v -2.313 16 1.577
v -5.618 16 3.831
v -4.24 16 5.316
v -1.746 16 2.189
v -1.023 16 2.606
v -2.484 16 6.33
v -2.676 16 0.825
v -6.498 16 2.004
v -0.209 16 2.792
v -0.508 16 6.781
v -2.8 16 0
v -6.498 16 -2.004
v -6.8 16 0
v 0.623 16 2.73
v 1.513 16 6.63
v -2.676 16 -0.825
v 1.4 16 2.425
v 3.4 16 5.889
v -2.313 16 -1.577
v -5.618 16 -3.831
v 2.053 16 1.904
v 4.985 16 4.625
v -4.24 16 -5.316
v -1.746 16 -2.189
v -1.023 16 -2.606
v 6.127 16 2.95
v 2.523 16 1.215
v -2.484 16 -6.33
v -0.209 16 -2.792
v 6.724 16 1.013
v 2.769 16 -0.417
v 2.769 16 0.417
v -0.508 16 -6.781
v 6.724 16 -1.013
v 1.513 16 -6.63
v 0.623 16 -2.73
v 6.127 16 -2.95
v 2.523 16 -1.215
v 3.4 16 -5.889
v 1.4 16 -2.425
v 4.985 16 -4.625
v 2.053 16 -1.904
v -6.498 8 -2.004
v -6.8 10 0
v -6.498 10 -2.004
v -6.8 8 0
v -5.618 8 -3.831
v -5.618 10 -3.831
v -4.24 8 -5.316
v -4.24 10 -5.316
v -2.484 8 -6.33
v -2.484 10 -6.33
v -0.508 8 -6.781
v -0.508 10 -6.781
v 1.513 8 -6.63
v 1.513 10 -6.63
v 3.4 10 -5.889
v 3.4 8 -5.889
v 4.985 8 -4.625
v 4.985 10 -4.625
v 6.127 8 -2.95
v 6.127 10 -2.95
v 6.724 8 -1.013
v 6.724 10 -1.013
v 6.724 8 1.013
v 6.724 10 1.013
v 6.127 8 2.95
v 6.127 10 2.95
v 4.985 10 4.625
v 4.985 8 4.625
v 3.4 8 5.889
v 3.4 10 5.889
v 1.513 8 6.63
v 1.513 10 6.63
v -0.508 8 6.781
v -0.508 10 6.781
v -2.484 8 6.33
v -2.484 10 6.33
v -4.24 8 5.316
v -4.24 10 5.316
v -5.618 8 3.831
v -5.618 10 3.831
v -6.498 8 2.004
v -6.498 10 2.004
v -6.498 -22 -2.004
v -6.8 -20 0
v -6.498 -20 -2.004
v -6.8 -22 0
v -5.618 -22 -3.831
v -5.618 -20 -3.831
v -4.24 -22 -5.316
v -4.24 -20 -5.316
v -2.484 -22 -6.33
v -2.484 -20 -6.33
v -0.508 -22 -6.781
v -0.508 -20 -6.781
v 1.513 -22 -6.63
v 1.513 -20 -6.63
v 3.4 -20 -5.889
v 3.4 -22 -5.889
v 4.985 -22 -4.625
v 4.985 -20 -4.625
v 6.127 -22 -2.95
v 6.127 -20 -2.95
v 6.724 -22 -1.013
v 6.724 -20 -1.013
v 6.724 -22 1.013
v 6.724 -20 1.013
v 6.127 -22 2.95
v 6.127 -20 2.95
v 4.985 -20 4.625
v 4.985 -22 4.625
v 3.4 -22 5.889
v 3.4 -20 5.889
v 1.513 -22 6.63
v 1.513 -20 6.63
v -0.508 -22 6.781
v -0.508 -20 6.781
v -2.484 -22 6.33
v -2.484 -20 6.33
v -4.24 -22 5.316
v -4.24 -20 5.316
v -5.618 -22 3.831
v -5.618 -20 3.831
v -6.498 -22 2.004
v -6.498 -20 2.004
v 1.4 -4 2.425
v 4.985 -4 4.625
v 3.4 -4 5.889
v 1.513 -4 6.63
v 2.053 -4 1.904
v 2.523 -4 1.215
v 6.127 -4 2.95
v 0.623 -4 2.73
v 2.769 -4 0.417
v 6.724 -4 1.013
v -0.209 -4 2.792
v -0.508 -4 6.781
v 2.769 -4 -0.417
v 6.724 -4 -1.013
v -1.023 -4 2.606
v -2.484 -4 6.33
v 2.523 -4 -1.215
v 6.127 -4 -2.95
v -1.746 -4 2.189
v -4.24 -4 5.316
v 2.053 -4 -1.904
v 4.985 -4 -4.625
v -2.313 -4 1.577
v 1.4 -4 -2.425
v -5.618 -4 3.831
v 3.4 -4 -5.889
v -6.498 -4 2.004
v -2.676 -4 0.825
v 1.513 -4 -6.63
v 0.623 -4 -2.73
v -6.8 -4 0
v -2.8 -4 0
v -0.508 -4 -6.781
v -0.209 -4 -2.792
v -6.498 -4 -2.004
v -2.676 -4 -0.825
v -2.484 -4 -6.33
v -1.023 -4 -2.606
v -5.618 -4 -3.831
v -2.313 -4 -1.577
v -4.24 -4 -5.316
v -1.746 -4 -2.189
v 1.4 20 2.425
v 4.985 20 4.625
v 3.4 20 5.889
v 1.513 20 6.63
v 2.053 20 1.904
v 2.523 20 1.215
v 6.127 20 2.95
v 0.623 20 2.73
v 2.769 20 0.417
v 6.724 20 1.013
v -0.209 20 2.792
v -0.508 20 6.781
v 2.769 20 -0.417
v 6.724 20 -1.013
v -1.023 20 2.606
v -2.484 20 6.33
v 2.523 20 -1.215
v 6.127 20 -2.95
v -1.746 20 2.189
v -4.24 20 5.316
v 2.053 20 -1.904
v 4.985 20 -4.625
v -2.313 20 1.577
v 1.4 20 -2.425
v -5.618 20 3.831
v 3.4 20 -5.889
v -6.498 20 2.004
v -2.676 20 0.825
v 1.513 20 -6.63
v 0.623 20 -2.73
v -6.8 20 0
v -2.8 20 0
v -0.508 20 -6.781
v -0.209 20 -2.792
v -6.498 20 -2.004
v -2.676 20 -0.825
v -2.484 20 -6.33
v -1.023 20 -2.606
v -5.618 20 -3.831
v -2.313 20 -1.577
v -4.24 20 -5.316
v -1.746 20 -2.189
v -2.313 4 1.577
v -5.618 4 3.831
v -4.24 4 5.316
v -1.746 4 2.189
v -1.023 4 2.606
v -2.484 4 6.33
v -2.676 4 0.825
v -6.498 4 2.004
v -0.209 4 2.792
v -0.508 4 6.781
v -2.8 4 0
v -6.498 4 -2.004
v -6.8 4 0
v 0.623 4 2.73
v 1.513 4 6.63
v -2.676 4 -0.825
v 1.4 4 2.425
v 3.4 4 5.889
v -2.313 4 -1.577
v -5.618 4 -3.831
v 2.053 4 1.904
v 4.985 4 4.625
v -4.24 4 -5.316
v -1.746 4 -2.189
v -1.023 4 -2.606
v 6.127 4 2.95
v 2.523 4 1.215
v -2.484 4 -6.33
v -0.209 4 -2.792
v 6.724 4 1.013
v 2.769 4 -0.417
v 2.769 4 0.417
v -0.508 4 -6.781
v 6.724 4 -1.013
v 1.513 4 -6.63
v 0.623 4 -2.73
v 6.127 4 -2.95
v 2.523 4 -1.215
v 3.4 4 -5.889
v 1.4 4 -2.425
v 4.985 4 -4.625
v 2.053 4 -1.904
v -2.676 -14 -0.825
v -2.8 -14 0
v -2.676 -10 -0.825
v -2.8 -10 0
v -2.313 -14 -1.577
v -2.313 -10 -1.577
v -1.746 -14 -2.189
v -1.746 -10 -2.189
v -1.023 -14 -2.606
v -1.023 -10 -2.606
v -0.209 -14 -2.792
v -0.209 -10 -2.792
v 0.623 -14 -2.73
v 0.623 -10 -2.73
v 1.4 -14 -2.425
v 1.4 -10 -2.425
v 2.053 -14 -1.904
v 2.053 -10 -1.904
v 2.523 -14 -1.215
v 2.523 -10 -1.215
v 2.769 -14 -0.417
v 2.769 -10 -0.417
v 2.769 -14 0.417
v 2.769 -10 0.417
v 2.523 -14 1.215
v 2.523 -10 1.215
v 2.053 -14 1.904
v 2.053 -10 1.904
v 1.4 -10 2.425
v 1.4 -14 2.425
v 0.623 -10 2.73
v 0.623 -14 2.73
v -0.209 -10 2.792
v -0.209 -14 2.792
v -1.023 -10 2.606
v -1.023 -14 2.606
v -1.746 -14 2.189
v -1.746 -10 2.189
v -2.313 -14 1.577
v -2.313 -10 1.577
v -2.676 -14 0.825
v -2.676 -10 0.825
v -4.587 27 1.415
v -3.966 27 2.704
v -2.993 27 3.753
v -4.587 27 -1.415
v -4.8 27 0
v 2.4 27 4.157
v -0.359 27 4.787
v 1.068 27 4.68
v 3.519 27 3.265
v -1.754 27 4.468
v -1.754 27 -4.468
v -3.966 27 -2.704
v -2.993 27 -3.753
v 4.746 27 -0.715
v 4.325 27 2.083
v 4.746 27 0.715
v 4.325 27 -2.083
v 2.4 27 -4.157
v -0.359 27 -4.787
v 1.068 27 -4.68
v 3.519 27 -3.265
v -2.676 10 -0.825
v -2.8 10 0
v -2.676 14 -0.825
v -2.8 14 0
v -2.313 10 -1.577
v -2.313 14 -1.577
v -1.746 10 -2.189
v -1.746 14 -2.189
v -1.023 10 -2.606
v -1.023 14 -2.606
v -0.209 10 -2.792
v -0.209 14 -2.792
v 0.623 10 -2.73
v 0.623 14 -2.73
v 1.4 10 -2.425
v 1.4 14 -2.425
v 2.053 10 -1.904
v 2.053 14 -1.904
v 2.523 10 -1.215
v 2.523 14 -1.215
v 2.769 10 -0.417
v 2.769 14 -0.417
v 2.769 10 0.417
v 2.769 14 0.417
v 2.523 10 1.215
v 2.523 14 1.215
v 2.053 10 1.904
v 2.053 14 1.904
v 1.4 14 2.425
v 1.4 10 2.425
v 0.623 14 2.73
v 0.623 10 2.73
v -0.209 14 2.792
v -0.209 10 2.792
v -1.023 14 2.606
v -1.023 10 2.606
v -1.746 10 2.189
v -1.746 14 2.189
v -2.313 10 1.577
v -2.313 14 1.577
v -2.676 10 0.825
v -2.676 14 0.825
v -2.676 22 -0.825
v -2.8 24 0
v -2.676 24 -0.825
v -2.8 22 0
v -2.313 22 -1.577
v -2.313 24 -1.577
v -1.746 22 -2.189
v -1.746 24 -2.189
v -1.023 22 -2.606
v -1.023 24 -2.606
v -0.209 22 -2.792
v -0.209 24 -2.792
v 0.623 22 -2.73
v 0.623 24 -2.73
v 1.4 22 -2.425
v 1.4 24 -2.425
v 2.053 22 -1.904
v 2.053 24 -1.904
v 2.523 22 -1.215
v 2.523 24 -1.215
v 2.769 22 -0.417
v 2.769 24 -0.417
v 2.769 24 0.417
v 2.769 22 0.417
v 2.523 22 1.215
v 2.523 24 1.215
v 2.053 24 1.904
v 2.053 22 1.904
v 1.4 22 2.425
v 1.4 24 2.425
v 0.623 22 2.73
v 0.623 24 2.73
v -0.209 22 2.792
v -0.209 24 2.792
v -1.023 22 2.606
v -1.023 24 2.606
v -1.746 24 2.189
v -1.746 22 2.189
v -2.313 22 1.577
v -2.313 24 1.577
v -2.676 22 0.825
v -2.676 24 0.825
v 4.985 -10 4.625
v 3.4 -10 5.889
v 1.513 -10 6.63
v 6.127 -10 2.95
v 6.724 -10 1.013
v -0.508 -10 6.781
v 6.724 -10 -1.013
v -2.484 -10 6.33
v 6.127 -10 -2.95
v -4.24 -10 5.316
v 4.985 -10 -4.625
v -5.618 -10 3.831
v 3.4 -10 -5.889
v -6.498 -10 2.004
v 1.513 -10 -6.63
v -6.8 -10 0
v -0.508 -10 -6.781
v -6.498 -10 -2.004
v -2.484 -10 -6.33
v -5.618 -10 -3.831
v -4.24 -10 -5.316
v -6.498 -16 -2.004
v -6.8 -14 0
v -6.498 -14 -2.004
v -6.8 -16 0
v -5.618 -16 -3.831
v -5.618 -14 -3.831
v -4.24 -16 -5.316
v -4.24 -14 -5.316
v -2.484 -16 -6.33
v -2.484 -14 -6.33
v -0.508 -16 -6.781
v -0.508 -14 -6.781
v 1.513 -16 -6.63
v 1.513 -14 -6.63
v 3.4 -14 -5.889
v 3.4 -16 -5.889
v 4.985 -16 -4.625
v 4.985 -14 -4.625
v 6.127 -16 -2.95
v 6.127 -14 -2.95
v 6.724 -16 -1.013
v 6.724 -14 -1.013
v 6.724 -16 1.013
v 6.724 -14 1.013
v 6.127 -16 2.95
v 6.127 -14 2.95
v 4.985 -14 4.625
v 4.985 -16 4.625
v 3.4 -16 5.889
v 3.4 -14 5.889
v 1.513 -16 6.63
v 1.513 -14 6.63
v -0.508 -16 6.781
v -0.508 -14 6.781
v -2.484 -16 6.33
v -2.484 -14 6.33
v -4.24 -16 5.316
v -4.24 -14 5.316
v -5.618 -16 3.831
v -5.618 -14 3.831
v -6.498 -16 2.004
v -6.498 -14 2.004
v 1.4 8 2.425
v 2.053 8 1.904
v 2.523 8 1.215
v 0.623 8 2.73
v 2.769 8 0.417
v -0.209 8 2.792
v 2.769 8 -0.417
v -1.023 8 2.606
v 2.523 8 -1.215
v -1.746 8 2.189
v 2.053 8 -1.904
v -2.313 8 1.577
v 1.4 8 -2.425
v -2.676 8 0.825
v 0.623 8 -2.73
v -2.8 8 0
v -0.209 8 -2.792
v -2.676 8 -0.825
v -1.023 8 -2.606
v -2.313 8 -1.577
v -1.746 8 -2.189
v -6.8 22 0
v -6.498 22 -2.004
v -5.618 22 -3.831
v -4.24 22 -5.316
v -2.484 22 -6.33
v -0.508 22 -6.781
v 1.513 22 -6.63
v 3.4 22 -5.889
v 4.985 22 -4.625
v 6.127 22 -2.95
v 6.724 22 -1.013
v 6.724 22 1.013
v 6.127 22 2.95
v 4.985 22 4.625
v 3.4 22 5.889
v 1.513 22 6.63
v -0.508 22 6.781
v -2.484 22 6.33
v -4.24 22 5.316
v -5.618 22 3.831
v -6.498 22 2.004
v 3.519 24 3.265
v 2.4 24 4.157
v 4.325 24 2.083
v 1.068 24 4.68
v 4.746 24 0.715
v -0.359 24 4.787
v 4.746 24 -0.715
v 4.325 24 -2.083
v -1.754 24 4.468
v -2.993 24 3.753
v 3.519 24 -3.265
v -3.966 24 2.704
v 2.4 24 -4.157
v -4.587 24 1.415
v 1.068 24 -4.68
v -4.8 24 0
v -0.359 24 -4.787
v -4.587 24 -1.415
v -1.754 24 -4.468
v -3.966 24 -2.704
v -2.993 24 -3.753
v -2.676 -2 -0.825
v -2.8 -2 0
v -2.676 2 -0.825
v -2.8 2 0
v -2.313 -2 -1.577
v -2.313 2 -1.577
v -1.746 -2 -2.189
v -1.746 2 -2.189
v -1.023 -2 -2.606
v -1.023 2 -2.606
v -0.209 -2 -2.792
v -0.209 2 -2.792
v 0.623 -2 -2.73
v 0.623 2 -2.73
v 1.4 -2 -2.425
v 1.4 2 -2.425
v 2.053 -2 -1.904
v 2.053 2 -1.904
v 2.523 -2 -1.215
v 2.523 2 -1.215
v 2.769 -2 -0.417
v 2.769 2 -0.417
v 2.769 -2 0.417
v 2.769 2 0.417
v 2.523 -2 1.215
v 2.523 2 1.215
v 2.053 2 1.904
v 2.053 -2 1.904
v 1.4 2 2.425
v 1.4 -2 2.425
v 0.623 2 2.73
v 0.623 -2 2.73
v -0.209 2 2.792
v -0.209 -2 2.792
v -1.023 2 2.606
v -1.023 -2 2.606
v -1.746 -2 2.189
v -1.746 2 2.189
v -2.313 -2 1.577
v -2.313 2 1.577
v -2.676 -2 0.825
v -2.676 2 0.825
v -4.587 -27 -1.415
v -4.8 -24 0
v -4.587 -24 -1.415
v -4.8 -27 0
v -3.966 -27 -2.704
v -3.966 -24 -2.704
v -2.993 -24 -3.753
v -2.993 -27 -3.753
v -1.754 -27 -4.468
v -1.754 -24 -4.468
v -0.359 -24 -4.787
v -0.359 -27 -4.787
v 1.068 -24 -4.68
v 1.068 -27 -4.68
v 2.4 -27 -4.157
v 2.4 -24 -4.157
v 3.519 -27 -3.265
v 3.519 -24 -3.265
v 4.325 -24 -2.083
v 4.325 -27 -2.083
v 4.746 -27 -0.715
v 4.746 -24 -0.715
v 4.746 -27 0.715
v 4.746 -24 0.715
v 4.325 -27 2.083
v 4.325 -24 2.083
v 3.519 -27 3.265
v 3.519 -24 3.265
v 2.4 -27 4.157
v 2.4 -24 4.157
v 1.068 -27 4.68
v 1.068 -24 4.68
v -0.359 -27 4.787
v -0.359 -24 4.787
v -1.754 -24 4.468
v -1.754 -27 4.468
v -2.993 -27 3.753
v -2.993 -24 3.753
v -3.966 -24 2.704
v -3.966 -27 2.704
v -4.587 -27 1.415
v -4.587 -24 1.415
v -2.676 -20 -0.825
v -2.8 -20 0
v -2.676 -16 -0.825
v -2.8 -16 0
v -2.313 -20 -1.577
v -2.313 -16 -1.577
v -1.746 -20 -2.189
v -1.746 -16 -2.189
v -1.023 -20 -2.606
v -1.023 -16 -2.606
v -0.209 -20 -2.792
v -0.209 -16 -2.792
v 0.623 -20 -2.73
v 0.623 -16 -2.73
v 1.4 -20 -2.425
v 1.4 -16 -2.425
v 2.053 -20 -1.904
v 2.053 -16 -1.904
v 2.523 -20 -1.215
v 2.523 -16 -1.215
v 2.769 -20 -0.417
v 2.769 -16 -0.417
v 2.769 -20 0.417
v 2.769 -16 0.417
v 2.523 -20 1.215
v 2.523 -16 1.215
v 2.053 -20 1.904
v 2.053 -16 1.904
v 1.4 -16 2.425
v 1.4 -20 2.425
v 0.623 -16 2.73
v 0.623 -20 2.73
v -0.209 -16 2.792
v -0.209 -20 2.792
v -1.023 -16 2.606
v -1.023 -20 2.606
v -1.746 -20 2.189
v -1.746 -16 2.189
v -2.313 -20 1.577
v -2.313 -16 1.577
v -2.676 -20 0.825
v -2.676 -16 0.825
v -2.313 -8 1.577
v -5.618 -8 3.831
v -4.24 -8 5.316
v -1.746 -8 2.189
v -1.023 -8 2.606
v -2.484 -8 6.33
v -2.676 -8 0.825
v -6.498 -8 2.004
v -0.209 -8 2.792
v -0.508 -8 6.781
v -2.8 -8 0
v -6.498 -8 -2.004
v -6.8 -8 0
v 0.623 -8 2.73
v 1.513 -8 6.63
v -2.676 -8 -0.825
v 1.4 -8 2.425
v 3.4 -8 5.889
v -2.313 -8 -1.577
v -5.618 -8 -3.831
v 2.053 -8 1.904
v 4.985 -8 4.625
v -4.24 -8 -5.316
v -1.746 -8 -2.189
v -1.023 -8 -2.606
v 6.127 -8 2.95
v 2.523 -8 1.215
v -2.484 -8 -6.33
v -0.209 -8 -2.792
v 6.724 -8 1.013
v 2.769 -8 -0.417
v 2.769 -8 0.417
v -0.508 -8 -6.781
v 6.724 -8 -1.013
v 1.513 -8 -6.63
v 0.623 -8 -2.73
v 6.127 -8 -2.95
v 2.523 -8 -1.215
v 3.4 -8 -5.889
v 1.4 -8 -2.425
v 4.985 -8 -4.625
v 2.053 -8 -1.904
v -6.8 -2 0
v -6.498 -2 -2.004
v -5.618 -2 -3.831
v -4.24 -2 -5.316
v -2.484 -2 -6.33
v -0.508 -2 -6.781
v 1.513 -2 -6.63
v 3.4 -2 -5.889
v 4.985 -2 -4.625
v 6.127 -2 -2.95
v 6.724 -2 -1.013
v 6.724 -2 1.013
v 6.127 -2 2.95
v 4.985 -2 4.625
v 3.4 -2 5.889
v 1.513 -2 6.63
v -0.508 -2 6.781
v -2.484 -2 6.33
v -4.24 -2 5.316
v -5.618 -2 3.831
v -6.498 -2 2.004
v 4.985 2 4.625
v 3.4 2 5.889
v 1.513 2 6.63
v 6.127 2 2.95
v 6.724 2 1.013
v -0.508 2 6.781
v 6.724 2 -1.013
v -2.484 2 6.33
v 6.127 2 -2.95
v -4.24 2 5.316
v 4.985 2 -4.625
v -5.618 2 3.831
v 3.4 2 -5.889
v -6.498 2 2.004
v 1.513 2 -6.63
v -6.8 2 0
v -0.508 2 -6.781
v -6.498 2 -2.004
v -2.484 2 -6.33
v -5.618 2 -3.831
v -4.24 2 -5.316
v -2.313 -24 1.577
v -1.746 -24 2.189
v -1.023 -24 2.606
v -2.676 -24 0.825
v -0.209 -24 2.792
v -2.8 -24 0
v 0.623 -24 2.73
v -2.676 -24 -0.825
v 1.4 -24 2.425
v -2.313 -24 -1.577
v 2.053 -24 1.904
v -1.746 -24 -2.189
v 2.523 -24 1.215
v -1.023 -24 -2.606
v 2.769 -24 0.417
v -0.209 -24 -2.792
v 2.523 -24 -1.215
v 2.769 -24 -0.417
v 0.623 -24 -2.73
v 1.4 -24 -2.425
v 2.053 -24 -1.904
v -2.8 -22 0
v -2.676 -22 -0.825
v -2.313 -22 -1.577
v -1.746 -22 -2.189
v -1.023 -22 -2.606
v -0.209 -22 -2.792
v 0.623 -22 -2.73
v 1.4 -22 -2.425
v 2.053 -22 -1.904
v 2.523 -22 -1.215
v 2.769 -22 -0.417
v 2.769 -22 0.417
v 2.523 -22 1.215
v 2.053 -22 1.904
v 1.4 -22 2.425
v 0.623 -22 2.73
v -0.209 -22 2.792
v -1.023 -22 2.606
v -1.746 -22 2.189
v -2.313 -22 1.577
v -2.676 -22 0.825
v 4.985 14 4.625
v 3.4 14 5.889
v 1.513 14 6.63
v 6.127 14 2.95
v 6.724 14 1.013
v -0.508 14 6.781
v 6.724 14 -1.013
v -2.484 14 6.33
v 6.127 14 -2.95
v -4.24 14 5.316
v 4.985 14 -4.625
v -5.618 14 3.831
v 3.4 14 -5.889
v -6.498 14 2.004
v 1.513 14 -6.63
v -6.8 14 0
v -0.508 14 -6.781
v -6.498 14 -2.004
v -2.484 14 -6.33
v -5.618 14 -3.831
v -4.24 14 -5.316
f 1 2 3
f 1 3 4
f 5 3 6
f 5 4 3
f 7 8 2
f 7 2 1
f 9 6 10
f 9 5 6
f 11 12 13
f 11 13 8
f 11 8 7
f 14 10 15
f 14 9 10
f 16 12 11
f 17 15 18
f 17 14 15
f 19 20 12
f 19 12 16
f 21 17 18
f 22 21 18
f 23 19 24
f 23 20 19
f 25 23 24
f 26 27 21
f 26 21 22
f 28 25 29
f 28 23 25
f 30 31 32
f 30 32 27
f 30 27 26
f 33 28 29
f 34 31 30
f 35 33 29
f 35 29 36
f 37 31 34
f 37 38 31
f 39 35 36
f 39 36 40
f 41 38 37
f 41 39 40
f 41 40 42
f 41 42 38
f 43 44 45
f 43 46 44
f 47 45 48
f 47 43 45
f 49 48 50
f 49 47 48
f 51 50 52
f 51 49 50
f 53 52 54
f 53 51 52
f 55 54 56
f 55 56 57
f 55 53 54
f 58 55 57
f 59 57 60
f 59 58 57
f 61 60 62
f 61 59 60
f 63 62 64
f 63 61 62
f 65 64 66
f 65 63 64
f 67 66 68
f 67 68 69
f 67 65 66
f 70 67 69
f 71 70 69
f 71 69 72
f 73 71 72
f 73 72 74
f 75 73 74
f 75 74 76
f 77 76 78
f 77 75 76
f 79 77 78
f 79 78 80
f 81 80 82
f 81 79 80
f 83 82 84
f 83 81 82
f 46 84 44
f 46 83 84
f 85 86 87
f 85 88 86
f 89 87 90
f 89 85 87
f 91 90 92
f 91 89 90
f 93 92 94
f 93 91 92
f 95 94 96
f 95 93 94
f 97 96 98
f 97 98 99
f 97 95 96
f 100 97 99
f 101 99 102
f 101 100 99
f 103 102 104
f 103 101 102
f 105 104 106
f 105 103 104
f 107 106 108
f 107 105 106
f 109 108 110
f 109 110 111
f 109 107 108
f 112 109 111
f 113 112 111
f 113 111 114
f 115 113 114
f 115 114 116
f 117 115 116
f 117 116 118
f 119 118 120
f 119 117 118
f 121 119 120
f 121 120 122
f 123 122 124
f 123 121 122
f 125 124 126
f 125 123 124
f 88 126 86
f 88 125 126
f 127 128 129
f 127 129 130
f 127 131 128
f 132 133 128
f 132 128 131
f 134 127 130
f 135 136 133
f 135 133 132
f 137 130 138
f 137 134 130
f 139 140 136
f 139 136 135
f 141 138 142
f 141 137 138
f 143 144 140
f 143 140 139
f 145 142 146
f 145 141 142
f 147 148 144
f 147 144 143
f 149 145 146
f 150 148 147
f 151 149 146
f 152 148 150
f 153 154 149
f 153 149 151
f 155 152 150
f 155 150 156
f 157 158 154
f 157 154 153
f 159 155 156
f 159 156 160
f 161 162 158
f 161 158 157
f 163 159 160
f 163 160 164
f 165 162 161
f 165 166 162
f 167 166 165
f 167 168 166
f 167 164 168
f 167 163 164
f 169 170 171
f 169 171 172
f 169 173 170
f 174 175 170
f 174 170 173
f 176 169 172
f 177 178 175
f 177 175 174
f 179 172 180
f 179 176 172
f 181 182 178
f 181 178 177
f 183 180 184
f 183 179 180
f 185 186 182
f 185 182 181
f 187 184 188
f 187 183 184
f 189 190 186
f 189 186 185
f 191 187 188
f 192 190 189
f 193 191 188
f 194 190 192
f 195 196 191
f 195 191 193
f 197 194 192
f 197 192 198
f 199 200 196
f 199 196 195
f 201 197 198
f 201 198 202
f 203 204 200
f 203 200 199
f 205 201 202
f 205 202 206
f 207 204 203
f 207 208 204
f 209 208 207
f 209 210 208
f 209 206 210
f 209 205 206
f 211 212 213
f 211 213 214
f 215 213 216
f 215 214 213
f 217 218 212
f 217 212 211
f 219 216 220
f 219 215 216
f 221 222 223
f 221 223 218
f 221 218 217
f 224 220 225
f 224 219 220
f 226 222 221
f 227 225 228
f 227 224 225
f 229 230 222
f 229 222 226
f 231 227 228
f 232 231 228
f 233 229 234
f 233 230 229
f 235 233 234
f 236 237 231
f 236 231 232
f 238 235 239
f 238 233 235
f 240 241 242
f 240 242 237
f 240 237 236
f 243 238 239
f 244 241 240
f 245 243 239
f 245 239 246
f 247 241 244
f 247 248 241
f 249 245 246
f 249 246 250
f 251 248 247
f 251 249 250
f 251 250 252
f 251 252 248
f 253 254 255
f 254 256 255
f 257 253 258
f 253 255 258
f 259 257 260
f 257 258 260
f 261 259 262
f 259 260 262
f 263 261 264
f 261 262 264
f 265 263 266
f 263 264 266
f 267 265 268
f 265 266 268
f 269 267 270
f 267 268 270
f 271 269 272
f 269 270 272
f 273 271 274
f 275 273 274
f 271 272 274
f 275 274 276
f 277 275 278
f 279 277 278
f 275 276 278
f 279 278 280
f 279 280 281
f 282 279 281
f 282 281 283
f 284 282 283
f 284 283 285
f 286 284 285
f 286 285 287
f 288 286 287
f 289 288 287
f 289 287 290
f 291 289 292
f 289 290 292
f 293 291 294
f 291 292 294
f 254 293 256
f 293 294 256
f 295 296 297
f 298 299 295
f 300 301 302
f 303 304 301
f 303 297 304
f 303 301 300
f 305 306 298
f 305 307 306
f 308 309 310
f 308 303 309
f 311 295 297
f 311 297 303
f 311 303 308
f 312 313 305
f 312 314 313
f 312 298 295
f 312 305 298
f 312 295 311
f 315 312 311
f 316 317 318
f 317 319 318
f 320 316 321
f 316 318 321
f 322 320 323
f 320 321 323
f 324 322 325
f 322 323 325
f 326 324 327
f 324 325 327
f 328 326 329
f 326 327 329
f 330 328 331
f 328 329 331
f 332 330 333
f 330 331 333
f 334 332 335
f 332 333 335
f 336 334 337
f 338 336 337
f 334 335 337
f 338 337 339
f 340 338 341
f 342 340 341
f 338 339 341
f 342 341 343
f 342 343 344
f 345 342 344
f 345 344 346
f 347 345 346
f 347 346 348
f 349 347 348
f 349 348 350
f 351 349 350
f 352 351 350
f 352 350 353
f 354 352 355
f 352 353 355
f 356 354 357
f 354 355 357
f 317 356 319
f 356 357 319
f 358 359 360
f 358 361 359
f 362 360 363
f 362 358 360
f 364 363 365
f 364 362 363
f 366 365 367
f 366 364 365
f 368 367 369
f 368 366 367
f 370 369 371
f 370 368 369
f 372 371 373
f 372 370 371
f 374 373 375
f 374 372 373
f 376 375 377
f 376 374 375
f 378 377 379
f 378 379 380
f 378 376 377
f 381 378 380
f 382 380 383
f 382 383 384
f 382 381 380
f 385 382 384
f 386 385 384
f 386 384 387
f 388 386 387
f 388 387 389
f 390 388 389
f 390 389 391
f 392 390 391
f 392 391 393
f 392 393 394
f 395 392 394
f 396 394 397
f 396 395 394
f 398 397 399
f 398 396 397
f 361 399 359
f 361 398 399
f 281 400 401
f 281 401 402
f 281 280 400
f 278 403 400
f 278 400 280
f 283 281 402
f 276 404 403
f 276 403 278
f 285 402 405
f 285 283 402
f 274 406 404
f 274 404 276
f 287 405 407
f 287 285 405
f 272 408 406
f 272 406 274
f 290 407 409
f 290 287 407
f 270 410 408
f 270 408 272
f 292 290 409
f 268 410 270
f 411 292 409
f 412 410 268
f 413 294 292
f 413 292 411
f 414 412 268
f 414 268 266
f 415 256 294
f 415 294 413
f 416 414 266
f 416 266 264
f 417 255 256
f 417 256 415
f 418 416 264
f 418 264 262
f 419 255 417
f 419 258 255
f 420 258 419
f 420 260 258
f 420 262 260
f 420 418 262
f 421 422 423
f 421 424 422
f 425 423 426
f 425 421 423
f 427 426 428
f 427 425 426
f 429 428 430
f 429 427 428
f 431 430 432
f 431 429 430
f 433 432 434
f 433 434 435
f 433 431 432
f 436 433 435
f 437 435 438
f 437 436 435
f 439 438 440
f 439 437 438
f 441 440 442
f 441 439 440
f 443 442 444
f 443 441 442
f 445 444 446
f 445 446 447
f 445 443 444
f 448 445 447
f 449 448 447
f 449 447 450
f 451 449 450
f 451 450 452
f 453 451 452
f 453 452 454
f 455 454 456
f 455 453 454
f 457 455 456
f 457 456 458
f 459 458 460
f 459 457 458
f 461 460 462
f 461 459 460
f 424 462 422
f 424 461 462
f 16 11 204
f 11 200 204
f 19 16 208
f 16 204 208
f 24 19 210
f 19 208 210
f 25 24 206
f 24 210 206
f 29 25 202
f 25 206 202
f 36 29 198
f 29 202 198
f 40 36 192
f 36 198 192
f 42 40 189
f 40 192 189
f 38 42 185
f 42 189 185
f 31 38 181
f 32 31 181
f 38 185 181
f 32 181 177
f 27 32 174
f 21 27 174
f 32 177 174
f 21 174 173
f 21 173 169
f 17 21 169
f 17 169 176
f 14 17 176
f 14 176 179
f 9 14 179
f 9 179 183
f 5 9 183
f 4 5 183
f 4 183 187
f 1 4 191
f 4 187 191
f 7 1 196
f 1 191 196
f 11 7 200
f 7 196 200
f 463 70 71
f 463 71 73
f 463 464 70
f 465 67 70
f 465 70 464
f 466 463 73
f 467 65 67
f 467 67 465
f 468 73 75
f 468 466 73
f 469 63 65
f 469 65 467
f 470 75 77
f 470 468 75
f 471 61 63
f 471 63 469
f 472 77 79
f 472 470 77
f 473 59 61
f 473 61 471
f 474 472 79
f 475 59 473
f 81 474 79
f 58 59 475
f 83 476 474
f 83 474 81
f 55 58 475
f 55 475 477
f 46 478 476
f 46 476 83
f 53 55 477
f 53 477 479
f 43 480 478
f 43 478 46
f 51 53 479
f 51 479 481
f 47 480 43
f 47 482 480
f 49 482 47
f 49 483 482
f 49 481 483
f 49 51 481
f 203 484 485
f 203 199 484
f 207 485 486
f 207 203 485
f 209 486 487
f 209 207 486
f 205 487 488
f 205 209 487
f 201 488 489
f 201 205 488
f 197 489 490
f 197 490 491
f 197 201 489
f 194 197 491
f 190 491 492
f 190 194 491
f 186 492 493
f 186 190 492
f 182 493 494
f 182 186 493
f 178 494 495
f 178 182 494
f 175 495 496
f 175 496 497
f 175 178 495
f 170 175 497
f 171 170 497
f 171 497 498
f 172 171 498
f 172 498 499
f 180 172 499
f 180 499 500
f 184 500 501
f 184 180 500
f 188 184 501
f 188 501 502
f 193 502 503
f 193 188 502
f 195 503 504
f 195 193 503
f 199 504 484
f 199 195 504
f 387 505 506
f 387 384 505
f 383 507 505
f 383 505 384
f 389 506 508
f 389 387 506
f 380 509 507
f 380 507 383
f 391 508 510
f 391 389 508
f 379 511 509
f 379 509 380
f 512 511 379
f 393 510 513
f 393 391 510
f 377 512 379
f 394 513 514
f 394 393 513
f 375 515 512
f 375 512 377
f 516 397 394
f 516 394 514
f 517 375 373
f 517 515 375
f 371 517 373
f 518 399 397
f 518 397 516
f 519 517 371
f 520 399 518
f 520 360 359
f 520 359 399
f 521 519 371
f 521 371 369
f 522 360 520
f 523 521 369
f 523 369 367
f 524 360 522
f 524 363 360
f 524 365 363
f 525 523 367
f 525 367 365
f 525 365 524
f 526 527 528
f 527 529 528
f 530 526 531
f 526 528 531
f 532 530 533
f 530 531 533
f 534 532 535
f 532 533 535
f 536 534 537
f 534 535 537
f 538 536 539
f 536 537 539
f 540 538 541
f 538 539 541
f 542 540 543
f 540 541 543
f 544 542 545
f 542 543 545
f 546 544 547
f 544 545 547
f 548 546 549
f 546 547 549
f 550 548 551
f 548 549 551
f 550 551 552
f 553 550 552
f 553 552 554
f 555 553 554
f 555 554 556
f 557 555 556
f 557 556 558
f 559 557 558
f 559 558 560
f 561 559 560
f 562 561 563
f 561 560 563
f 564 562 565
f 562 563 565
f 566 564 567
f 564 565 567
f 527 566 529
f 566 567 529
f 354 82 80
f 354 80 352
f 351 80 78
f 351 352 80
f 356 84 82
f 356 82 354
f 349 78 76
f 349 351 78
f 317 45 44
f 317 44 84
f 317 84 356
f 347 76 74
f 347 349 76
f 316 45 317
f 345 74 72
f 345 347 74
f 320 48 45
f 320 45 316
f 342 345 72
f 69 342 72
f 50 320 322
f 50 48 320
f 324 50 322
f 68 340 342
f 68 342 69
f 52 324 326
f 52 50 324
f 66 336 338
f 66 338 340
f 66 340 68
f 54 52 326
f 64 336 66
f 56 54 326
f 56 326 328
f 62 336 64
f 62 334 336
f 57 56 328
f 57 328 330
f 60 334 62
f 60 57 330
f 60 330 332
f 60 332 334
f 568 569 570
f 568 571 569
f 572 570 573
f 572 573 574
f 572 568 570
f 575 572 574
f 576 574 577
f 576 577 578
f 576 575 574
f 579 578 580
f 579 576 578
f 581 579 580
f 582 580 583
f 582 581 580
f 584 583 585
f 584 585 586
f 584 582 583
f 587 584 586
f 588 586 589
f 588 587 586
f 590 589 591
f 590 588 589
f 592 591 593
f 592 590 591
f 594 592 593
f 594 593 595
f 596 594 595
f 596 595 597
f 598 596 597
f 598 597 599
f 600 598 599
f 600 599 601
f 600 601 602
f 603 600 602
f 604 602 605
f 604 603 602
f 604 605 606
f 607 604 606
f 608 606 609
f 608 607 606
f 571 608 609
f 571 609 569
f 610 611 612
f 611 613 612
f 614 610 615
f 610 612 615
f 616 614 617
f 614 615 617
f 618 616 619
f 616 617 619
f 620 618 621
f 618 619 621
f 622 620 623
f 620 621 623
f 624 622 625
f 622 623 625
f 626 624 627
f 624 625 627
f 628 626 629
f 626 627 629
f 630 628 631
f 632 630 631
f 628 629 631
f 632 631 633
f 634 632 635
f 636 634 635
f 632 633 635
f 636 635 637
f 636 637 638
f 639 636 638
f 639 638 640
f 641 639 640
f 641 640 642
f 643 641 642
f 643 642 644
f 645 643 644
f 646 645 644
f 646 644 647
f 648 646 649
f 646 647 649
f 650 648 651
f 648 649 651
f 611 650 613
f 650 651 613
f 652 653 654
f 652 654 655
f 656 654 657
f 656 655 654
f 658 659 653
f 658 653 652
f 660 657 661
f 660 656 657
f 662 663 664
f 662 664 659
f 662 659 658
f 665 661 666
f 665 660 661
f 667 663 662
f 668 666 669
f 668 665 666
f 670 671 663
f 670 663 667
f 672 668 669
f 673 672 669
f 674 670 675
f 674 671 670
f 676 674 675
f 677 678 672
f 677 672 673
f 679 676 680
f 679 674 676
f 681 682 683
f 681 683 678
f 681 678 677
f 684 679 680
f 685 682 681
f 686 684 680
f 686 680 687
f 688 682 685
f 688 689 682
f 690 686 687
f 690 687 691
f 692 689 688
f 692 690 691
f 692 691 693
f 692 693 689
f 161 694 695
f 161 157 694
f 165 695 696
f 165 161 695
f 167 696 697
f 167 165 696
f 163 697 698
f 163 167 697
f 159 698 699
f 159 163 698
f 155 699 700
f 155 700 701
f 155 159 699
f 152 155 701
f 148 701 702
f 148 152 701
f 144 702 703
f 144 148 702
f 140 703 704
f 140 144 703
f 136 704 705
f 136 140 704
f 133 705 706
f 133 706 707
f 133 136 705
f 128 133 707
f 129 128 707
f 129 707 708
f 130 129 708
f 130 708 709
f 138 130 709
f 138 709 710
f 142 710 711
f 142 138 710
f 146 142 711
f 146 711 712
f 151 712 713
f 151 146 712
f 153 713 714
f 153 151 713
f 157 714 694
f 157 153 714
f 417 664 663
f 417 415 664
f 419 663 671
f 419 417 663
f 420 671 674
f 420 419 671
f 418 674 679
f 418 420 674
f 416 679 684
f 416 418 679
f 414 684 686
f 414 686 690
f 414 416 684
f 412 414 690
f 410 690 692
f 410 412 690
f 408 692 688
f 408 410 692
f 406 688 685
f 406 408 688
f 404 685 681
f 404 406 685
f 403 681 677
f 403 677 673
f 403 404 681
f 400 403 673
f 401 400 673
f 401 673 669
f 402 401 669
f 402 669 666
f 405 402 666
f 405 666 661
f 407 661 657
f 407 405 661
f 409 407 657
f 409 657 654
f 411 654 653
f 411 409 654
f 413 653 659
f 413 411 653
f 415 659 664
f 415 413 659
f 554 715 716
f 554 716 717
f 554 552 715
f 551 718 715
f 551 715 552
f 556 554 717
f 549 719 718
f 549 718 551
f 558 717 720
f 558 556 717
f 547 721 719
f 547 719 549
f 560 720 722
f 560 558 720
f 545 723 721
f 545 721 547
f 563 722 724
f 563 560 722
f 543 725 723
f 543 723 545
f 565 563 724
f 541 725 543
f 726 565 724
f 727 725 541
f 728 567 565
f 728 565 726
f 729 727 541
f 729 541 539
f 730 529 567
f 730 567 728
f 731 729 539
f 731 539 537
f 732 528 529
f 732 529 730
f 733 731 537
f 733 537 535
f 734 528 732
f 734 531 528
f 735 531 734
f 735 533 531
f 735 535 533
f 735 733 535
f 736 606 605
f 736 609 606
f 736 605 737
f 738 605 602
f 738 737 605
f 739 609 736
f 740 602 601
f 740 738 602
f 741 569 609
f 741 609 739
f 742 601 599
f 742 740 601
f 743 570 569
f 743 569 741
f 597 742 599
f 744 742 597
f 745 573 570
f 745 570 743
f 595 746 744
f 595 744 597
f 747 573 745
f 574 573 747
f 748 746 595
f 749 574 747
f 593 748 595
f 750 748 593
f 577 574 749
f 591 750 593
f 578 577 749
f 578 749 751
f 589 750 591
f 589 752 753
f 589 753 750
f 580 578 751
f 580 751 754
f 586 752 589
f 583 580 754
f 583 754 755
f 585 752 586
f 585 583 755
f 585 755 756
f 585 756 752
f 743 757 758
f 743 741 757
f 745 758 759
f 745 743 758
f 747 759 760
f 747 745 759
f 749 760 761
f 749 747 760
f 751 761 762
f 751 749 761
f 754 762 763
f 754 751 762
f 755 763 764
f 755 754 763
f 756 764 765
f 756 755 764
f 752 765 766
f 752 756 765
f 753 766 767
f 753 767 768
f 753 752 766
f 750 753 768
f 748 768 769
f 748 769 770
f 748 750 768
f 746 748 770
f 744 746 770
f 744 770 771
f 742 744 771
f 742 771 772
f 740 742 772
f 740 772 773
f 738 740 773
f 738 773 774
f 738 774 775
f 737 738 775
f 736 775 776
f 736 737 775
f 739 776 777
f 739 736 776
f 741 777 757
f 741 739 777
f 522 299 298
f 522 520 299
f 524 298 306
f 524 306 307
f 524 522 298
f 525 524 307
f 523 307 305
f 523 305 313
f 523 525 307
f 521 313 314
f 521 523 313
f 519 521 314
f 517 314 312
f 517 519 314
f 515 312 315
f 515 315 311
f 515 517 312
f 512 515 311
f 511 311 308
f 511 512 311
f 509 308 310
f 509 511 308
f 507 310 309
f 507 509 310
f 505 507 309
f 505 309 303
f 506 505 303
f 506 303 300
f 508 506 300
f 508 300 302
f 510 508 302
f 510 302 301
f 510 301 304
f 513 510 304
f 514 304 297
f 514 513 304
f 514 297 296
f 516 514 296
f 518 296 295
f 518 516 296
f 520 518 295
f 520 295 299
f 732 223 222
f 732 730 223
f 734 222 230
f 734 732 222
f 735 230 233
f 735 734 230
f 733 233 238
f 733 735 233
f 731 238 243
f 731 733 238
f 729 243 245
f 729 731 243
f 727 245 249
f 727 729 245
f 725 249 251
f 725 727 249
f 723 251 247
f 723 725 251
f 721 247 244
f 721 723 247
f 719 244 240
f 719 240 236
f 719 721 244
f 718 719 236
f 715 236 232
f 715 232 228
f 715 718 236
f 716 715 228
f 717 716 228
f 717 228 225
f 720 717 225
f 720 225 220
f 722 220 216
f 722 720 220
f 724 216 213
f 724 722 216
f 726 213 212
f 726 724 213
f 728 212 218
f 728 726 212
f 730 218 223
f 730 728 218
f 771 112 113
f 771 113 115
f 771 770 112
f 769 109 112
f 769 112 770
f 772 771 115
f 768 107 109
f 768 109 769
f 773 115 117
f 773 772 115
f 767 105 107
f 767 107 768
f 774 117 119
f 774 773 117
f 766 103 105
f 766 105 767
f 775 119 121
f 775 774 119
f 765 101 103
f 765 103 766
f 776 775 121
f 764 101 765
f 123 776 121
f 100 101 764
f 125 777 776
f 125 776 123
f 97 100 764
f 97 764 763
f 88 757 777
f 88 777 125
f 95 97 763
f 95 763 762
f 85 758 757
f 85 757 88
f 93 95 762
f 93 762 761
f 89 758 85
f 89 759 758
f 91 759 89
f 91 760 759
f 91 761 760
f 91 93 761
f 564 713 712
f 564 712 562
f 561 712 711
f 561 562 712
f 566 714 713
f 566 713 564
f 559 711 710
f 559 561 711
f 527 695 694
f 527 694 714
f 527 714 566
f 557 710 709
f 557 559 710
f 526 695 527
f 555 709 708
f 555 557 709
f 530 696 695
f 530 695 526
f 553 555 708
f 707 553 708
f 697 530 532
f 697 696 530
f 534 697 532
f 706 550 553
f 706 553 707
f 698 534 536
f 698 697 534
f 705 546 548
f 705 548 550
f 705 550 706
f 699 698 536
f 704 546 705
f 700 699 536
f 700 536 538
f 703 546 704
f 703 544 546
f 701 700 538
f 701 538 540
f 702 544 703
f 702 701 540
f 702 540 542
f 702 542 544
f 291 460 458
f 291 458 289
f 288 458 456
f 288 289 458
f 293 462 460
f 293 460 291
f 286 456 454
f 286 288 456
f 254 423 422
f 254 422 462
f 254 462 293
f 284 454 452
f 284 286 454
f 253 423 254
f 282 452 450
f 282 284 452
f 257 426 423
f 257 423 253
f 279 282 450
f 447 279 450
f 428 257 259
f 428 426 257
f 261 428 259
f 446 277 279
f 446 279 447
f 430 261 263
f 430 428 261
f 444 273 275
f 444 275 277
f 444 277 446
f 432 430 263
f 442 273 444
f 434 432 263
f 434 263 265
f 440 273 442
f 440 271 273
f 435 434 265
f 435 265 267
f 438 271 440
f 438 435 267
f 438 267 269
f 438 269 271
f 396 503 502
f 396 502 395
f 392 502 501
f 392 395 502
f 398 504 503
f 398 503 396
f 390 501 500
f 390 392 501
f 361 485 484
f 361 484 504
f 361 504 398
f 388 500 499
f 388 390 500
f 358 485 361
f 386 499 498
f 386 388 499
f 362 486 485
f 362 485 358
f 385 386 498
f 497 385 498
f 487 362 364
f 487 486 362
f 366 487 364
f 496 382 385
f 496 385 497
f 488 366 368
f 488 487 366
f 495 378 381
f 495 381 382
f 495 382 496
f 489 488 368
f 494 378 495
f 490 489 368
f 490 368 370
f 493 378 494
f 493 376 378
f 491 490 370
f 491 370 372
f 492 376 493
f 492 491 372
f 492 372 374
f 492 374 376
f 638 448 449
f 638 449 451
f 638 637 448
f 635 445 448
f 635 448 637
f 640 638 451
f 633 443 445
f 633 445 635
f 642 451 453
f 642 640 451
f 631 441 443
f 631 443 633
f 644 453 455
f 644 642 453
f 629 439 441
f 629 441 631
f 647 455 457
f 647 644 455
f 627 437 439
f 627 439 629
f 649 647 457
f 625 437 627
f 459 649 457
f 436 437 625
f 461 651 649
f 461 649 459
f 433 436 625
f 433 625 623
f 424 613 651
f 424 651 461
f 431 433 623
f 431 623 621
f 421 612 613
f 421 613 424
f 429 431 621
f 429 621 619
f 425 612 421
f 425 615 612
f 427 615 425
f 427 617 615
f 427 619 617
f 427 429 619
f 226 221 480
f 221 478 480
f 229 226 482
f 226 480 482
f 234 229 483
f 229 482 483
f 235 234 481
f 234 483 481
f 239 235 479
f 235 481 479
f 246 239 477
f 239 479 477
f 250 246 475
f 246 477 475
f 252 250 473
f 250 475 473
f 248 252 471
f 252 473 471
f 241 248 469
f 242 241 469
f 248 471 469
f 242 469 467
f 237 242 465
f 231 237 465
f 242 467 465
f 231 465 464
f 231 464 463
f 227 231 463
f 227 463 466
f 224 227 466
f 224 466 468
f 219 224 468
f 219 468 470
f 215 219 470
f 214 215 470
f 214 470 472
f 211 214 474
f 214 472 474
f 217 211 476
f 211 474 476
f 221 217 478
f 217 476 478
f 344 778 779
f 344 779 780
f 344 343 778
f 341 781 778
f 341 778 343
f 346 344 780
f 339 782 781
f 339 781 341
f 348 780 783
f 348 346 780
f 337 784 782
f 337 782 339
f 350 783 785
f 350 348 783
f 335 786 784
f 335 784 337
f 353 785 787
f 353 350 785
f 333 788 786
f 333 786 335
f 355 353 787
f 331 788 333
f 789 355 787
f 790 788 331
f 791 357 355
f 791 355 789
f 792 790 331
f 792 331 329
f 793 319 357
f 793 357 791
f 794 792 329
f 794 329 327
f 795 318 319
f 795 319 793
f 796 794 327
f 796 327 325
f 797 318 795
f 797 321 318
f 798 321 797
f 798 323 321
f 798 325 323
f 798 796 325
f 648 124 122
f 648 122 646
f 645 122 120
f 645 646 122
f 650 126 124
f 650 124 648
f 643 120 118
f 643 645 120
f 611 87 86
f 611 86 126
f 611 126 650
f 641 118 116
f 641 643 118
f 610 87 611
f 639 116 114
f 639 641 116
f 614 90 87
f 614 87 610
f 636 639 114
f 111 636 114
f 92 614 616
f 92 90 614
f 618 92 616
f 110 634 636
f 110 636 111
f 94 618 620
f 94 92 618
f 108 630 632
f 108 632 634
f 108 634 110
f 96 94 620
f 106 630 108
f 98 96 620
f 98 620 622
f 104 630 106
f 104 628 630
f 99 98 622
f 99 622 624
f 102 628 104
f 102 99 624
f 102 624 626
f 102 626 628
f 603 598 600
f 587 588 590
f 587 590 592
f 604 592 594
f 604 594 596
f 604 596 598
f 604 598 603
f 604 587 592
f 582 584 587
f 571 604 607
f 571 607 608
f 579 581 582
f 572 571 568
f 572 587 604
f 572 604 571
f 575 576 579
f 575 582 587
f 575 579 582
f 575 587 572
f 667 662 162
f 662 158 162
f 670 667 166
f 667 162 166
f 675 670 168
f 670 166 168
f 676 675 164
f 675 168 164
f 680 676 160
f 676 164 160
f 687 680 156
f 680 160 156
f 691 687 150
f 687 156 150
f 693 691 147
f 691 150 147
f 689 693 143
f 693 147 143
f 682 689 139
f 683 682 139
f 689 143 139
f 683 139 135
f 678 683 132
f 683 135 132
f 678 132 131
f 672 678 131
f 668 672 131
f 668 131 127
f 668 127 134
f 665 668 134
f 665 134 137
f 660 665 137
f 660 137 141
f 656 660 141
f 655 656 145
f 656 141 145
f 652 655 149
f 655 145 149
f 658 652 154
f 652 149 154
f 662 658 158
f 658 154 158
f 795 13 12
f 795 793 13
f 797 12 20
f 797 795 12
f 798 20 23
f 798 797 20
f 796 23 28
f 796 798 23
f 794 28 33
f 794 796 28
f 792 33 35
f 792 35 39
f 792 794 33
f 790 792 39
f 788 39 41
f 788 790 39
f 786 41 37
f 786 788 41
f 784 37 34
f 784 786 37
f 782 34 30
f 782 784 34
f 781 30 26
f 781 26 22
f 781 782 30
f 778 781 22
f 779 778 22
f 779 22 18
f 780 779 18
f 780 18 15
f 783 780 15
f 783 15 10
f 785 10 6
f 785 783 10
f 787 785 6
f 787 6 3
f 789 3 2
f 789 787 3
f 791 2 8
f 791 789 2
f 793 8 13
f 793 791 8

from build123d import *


with BuildPart() as part:
    # Sketch1 → Revolve1 (revolve)
    with BuildSketch(Plane.XY, mode=Mode.PRIVATE) as revolve1_sk:
        Polygon((2.8, 24), (2.8, 22), (6.8, 22), (6.8, 20), (2.8, 20), (2.8, 18), (2.8, 16), (6.8, 16), (6.8, 14), (2.8, 14), (2.8, 12), (2.8, 10), (6.8, 10), (6.8, 8), (2.8, 8), (2.8, 6), (2.8, 4), (6.8, 4), (6.8, 2), (2.8, 2), (2.8, 0), (2.8, -2), (6.8, -2), (6.8, -4), (2.8, -4), (2.8, -6), (2.8, -8), (6.8, -8), (6.8, -10), (2.8, -10), (2.8, -12), (2.8, -14), (6.8, -14), (6.8, -16), (2.8, -16), (2.8, -18), (2.8, -20), (6.8, -20), (6.8, -22), (2.8, -22), (2.8, -24), (4.8, -24), (4.8, -27), (0, -27), (0, 27), (4.8, 27), (4.8, 24), align=None)
    revolve(revolve1_sk.sketch.rotate(Axis((0, 27, 0), (0, -1, 0)), 180), axis=Axis((0, 27, 0), (0, -1, 0)))


solid = part.part
